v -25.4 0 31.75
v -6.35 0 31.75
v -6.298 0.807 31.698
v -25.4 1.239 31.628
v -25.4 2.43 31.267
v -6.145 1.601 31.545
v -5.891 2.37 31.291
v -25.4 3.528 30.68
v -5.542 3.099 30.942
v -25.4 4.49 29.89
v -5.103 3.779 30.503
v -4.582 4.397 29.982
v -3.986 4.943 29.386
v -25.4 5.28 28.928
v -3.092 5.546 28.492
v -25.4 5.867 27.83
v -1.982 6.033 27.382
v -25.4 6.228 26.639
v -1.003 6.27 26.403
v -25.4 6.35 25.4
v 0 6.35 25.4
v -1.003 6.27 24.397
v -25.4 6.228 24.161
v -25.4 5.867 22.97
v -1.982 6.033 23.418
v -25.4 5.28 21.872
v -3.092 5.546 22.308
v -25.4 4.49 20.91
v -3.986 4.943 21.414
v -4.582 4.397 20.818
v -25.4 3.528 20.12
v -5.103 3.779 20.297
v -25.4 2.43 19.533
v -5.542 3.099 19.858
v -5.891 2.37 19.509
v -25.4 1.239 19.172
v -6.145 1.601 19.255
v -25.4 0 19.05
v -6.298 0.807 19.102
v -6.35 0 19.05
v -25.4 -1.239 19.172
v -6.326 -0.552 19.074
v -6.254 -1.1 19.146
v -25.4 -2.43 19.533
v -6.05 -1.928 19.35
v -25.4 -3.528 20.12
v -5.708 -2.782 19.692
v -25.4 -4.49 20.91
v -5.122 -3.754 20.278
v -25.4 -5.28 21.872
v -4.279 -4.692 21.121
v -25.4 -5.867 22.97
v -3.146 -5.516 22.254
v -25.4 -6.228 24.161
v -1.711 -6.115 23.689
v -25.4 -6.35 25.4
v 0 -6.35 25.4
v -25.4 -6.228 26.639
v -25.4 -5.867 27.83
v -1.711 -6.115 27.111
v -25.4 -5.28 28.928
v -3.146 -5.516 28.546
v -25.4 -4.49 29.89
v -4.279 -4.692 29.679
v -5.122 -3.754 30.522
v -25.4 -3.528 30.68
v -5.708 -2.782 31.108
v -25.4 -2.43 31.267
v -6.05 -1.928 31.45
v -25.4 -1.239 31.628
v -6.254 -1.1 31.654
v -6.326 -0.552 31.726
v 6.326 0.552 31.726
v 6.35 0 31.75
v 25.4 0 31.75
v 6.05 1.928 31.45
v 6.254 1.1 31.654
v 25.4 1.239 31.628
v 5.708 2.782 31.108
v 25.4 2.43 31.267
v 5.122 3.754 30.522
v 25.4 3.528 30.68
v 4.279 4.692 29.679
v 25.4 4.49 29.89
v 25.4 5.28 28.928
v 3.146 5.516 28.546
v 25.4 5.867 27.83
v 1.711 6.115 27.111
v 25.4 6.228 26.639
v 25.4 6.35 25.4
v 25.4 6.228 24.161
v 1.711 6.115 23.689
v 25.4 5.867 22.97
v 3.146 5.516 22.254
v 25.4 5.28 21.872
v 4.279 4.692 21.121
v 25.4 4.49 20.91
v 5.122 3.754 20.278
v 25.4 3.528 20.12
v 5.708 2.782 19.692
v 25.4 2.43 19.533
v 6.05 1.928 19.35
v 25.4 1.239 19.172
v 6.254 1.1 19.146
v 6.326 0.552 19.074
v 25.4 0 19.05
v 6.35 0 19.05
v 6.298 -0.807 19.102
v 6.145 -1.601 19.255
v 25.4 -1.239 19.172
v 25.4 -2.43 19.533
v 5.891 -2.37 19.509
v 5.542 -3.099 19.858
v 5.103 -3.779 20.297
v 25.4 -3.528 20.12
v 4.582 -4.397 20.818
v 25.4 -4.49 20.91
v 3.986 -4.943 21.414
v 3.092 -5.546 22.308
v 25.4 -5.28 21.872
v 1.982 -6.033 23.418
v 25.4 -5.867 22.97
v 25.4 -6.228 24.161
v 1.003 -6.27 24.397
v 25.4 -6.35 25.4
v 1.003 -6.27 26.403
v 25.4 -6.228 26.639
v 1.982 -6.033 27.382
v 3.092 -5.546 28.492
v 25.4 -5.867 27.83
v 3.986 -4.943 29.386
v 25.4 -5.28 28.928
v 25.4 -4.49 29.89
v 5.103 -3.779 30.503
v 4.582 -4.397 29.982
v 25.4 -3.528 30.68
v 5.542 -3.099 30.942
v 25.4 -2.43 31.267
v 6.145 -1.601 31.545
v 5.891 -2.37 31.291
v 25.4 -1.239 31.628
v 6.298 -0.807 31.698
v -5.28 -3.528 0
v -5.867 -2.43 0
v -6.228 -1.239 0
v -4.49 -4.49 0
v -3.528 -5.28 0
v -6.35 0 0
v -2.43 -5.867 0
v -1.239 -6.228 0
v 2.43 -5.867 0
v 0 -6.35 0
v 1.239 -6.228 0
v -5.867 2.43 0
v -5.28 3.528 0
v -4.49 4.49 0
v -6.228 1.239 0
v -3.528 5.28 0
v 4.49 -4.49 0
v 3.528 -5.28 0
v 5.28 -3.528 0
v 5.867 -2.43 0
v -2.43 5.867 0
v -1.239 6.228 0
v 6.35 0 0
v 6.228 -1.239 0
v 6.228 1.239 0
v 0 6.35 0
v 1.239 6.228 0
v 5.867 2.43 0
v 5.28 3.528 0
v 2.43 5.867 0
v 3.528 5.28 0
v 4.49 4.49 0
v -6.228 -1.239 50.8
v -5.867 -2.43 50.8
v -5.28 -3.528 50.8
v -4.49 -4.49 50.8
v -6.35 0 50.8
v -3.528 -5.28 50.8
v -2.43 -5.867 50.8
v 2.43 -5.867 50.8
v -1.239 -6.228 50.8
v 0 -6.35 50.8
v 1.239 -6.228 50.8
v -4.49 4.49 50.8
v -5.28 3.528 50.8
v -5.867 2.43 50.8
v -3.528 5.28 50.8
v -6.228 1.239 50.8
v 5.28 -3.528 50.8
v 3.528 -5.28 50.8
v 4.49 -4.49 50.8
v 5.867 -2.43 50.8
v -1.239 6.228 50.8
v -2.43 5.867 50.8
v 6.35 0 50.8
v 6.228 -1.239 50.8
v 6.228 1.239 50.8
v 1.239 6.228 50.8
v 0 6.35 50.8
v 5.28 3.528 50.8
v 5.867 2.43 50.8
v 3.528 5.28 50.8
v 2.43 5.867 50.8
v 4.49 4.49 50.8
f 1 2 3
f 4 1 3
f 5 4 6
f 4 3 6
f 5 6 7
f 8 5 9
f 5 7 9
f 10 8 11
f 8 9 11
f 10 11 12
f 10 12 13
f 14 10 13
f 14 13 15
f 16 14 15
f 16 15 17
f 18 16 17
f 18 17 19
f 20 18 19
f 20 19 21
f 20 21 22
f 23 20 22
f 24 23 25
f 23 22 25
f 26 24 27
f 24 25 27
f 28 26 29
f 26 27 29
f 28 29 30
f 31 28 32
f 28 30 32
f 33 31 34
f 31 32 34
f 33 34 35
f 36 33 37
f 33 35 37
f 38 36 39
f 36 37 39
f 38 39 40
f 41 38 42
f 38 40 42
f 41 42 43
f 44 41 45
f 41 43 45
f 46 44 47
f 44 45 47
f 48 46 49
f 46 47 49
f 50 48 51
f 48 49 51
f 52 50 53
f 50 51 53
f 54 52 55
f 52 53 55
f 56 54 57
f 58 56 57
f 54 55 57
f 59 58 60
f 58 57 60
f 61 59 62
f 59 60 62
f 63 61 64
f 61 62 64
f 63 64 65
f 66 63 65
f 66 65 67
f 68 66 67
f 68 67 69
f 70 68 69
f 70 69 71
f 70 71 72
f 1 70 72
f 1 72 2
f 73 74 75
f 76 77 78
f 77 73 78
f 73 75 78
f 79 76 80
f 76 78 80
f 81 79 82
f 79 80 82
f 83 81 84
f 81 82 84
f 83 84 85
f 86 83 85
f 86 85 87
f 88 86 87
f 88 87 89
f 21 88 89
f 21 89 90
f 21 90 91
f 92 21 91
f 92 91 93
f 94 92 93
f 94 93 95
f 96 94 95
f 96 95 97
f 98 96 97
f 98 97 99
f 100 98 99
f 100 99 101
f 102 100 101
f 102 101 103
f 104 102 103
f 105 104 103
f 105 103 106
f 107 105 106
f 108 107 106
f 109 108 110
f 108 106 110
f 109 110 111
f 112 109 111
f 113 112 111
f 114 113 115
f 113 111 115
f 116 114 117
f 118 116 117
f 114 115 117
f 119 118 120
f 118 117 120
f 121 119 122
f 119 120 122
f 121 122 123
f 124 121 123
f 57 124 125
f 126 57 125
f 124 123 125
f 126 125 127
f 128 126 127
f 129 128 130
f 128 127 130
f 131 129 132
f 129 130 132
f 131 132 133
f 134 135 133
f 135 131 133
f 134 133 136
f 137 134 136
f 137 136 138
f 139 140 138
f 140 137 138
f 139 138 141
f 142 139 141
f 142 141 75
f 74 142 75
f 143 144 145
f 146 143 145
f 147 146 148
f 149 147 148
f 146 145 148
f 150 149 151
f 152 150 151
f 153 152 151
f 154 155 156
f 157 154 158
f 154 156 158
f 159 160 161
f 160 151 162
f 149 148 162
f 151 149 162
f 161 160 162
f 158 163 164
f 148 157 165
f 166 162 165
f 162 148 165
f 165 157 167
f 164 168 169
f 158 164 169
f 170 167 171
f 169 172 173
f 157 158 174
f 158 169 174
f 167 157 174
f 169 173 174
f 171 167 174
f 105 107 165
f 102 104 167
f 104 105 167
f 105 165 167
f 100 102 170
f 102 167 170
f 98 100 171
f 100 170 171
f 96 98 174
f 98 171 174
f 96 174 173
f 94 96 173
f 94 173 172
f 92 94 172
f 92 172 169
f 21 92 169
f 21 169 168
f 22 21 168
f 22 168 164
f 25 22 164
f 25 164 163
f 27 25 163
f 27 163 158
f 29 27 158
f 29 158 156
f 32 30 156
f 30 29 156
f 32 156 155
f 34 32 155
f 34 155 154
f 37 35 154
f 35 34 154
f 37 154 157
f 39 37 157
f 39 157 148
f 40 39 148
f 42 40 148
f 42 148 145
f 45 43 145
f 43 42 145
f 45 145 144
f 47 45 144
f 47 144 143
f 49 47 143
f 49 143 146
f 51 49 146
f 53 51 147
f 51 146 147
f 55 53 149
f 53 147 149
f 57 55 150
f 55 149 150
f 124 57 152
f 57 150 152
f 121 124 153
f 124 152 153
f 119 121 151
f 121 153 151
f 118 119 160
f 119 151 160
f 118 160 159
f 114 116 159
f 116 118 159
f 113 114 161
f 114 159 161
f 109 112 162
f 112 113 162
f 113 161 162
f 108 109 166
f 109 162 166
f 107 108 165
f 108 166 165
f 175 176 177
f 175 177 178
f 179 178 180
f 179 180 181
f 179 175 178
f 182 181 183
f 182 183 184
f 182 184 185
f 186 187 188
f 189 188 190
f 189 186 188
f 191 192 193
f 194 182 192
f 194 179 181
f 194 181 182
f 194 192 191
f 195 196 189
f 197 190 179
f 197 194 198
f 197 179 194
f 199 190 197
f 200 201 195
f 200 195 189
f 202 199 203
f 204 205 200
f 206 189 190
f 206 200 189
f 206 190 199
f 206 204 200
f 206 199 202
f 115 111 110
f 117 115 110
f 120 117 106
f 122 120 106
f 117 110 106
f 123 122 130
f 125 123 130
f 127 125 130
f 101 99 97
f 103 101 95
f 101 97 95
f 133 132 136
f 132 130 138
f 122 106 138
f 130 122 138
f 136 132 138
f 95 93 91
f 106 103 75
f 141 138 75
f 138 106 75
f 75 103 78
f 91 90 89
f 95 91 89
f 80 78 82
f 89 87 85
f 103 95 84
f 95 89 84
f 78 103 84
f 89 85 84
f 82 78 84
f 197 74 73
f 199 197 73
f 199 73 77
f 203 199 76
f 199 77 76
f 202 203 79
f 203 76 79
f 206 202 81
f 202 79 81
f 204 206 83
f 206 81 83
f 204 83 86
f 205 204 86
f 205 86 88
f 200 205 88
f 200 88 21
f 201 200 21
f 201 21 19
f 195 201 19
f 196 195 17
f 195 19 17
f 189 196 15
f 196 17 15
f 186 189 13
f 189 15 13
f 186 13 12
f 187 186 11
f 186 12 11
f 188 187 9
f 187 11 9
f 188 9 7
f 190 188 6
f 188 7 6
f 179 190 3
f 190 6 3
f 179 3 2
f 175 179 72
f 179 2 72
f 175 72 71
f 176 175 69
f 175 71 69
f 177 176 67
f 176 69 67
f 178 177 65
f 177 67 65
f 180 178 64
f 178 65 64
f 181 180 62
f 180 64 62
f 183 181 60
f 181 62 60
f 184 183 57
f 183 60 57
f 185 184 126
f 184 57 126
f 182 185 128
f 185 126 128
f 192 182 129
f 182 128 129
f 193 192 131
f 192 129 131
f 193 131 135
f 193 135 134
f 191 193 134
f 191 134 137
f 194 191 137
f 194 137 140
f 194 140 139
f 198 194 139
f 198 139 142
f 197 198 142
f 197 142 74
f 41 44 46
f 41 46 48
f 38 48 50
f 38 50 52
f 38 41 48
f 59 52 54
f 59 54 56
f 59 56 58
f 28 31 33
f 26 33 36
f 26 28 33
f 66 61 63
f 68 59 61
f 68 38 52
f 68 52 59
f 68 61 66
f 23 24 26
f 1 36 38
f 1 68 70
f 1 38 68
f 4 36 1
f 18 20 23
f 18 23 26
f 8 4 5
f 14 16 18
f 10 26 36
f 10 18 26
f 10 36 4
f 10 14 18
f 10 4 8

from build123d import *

# Parameters (mm, degrees)
SKETCH1_R           = 6.35
BOSS_EXTRUDE1_DEPTH = 50.8
CIRPATTERN1_COUNT   = 2
CIRPATTERN1_ANGLE   = 90


with BuildPart() as part:
    # Sketch1 → Boss-Extrude1 (new body)
    with BuildSketch(Plane.XY):
        Circle(SKETCH1_R)
    boss_extrude1 = extrude(amount=BOSS_EXTRUDE1_DEPTH)

    # CirPattern1: Boss-Extrude1 ×2 about axis
    cirpattern1_axis = Axis((0, 6.35, 25.4), (0, -1, 0))
    for i in range(1, CIRPATTERN1_COUNT):
        add(boss_extrude1.rotate(cirpattern1_axis, i * CIRPATTERN1_ANGLE / (CIRPATTERN1_COUNT - 1)))


solid = part.part
